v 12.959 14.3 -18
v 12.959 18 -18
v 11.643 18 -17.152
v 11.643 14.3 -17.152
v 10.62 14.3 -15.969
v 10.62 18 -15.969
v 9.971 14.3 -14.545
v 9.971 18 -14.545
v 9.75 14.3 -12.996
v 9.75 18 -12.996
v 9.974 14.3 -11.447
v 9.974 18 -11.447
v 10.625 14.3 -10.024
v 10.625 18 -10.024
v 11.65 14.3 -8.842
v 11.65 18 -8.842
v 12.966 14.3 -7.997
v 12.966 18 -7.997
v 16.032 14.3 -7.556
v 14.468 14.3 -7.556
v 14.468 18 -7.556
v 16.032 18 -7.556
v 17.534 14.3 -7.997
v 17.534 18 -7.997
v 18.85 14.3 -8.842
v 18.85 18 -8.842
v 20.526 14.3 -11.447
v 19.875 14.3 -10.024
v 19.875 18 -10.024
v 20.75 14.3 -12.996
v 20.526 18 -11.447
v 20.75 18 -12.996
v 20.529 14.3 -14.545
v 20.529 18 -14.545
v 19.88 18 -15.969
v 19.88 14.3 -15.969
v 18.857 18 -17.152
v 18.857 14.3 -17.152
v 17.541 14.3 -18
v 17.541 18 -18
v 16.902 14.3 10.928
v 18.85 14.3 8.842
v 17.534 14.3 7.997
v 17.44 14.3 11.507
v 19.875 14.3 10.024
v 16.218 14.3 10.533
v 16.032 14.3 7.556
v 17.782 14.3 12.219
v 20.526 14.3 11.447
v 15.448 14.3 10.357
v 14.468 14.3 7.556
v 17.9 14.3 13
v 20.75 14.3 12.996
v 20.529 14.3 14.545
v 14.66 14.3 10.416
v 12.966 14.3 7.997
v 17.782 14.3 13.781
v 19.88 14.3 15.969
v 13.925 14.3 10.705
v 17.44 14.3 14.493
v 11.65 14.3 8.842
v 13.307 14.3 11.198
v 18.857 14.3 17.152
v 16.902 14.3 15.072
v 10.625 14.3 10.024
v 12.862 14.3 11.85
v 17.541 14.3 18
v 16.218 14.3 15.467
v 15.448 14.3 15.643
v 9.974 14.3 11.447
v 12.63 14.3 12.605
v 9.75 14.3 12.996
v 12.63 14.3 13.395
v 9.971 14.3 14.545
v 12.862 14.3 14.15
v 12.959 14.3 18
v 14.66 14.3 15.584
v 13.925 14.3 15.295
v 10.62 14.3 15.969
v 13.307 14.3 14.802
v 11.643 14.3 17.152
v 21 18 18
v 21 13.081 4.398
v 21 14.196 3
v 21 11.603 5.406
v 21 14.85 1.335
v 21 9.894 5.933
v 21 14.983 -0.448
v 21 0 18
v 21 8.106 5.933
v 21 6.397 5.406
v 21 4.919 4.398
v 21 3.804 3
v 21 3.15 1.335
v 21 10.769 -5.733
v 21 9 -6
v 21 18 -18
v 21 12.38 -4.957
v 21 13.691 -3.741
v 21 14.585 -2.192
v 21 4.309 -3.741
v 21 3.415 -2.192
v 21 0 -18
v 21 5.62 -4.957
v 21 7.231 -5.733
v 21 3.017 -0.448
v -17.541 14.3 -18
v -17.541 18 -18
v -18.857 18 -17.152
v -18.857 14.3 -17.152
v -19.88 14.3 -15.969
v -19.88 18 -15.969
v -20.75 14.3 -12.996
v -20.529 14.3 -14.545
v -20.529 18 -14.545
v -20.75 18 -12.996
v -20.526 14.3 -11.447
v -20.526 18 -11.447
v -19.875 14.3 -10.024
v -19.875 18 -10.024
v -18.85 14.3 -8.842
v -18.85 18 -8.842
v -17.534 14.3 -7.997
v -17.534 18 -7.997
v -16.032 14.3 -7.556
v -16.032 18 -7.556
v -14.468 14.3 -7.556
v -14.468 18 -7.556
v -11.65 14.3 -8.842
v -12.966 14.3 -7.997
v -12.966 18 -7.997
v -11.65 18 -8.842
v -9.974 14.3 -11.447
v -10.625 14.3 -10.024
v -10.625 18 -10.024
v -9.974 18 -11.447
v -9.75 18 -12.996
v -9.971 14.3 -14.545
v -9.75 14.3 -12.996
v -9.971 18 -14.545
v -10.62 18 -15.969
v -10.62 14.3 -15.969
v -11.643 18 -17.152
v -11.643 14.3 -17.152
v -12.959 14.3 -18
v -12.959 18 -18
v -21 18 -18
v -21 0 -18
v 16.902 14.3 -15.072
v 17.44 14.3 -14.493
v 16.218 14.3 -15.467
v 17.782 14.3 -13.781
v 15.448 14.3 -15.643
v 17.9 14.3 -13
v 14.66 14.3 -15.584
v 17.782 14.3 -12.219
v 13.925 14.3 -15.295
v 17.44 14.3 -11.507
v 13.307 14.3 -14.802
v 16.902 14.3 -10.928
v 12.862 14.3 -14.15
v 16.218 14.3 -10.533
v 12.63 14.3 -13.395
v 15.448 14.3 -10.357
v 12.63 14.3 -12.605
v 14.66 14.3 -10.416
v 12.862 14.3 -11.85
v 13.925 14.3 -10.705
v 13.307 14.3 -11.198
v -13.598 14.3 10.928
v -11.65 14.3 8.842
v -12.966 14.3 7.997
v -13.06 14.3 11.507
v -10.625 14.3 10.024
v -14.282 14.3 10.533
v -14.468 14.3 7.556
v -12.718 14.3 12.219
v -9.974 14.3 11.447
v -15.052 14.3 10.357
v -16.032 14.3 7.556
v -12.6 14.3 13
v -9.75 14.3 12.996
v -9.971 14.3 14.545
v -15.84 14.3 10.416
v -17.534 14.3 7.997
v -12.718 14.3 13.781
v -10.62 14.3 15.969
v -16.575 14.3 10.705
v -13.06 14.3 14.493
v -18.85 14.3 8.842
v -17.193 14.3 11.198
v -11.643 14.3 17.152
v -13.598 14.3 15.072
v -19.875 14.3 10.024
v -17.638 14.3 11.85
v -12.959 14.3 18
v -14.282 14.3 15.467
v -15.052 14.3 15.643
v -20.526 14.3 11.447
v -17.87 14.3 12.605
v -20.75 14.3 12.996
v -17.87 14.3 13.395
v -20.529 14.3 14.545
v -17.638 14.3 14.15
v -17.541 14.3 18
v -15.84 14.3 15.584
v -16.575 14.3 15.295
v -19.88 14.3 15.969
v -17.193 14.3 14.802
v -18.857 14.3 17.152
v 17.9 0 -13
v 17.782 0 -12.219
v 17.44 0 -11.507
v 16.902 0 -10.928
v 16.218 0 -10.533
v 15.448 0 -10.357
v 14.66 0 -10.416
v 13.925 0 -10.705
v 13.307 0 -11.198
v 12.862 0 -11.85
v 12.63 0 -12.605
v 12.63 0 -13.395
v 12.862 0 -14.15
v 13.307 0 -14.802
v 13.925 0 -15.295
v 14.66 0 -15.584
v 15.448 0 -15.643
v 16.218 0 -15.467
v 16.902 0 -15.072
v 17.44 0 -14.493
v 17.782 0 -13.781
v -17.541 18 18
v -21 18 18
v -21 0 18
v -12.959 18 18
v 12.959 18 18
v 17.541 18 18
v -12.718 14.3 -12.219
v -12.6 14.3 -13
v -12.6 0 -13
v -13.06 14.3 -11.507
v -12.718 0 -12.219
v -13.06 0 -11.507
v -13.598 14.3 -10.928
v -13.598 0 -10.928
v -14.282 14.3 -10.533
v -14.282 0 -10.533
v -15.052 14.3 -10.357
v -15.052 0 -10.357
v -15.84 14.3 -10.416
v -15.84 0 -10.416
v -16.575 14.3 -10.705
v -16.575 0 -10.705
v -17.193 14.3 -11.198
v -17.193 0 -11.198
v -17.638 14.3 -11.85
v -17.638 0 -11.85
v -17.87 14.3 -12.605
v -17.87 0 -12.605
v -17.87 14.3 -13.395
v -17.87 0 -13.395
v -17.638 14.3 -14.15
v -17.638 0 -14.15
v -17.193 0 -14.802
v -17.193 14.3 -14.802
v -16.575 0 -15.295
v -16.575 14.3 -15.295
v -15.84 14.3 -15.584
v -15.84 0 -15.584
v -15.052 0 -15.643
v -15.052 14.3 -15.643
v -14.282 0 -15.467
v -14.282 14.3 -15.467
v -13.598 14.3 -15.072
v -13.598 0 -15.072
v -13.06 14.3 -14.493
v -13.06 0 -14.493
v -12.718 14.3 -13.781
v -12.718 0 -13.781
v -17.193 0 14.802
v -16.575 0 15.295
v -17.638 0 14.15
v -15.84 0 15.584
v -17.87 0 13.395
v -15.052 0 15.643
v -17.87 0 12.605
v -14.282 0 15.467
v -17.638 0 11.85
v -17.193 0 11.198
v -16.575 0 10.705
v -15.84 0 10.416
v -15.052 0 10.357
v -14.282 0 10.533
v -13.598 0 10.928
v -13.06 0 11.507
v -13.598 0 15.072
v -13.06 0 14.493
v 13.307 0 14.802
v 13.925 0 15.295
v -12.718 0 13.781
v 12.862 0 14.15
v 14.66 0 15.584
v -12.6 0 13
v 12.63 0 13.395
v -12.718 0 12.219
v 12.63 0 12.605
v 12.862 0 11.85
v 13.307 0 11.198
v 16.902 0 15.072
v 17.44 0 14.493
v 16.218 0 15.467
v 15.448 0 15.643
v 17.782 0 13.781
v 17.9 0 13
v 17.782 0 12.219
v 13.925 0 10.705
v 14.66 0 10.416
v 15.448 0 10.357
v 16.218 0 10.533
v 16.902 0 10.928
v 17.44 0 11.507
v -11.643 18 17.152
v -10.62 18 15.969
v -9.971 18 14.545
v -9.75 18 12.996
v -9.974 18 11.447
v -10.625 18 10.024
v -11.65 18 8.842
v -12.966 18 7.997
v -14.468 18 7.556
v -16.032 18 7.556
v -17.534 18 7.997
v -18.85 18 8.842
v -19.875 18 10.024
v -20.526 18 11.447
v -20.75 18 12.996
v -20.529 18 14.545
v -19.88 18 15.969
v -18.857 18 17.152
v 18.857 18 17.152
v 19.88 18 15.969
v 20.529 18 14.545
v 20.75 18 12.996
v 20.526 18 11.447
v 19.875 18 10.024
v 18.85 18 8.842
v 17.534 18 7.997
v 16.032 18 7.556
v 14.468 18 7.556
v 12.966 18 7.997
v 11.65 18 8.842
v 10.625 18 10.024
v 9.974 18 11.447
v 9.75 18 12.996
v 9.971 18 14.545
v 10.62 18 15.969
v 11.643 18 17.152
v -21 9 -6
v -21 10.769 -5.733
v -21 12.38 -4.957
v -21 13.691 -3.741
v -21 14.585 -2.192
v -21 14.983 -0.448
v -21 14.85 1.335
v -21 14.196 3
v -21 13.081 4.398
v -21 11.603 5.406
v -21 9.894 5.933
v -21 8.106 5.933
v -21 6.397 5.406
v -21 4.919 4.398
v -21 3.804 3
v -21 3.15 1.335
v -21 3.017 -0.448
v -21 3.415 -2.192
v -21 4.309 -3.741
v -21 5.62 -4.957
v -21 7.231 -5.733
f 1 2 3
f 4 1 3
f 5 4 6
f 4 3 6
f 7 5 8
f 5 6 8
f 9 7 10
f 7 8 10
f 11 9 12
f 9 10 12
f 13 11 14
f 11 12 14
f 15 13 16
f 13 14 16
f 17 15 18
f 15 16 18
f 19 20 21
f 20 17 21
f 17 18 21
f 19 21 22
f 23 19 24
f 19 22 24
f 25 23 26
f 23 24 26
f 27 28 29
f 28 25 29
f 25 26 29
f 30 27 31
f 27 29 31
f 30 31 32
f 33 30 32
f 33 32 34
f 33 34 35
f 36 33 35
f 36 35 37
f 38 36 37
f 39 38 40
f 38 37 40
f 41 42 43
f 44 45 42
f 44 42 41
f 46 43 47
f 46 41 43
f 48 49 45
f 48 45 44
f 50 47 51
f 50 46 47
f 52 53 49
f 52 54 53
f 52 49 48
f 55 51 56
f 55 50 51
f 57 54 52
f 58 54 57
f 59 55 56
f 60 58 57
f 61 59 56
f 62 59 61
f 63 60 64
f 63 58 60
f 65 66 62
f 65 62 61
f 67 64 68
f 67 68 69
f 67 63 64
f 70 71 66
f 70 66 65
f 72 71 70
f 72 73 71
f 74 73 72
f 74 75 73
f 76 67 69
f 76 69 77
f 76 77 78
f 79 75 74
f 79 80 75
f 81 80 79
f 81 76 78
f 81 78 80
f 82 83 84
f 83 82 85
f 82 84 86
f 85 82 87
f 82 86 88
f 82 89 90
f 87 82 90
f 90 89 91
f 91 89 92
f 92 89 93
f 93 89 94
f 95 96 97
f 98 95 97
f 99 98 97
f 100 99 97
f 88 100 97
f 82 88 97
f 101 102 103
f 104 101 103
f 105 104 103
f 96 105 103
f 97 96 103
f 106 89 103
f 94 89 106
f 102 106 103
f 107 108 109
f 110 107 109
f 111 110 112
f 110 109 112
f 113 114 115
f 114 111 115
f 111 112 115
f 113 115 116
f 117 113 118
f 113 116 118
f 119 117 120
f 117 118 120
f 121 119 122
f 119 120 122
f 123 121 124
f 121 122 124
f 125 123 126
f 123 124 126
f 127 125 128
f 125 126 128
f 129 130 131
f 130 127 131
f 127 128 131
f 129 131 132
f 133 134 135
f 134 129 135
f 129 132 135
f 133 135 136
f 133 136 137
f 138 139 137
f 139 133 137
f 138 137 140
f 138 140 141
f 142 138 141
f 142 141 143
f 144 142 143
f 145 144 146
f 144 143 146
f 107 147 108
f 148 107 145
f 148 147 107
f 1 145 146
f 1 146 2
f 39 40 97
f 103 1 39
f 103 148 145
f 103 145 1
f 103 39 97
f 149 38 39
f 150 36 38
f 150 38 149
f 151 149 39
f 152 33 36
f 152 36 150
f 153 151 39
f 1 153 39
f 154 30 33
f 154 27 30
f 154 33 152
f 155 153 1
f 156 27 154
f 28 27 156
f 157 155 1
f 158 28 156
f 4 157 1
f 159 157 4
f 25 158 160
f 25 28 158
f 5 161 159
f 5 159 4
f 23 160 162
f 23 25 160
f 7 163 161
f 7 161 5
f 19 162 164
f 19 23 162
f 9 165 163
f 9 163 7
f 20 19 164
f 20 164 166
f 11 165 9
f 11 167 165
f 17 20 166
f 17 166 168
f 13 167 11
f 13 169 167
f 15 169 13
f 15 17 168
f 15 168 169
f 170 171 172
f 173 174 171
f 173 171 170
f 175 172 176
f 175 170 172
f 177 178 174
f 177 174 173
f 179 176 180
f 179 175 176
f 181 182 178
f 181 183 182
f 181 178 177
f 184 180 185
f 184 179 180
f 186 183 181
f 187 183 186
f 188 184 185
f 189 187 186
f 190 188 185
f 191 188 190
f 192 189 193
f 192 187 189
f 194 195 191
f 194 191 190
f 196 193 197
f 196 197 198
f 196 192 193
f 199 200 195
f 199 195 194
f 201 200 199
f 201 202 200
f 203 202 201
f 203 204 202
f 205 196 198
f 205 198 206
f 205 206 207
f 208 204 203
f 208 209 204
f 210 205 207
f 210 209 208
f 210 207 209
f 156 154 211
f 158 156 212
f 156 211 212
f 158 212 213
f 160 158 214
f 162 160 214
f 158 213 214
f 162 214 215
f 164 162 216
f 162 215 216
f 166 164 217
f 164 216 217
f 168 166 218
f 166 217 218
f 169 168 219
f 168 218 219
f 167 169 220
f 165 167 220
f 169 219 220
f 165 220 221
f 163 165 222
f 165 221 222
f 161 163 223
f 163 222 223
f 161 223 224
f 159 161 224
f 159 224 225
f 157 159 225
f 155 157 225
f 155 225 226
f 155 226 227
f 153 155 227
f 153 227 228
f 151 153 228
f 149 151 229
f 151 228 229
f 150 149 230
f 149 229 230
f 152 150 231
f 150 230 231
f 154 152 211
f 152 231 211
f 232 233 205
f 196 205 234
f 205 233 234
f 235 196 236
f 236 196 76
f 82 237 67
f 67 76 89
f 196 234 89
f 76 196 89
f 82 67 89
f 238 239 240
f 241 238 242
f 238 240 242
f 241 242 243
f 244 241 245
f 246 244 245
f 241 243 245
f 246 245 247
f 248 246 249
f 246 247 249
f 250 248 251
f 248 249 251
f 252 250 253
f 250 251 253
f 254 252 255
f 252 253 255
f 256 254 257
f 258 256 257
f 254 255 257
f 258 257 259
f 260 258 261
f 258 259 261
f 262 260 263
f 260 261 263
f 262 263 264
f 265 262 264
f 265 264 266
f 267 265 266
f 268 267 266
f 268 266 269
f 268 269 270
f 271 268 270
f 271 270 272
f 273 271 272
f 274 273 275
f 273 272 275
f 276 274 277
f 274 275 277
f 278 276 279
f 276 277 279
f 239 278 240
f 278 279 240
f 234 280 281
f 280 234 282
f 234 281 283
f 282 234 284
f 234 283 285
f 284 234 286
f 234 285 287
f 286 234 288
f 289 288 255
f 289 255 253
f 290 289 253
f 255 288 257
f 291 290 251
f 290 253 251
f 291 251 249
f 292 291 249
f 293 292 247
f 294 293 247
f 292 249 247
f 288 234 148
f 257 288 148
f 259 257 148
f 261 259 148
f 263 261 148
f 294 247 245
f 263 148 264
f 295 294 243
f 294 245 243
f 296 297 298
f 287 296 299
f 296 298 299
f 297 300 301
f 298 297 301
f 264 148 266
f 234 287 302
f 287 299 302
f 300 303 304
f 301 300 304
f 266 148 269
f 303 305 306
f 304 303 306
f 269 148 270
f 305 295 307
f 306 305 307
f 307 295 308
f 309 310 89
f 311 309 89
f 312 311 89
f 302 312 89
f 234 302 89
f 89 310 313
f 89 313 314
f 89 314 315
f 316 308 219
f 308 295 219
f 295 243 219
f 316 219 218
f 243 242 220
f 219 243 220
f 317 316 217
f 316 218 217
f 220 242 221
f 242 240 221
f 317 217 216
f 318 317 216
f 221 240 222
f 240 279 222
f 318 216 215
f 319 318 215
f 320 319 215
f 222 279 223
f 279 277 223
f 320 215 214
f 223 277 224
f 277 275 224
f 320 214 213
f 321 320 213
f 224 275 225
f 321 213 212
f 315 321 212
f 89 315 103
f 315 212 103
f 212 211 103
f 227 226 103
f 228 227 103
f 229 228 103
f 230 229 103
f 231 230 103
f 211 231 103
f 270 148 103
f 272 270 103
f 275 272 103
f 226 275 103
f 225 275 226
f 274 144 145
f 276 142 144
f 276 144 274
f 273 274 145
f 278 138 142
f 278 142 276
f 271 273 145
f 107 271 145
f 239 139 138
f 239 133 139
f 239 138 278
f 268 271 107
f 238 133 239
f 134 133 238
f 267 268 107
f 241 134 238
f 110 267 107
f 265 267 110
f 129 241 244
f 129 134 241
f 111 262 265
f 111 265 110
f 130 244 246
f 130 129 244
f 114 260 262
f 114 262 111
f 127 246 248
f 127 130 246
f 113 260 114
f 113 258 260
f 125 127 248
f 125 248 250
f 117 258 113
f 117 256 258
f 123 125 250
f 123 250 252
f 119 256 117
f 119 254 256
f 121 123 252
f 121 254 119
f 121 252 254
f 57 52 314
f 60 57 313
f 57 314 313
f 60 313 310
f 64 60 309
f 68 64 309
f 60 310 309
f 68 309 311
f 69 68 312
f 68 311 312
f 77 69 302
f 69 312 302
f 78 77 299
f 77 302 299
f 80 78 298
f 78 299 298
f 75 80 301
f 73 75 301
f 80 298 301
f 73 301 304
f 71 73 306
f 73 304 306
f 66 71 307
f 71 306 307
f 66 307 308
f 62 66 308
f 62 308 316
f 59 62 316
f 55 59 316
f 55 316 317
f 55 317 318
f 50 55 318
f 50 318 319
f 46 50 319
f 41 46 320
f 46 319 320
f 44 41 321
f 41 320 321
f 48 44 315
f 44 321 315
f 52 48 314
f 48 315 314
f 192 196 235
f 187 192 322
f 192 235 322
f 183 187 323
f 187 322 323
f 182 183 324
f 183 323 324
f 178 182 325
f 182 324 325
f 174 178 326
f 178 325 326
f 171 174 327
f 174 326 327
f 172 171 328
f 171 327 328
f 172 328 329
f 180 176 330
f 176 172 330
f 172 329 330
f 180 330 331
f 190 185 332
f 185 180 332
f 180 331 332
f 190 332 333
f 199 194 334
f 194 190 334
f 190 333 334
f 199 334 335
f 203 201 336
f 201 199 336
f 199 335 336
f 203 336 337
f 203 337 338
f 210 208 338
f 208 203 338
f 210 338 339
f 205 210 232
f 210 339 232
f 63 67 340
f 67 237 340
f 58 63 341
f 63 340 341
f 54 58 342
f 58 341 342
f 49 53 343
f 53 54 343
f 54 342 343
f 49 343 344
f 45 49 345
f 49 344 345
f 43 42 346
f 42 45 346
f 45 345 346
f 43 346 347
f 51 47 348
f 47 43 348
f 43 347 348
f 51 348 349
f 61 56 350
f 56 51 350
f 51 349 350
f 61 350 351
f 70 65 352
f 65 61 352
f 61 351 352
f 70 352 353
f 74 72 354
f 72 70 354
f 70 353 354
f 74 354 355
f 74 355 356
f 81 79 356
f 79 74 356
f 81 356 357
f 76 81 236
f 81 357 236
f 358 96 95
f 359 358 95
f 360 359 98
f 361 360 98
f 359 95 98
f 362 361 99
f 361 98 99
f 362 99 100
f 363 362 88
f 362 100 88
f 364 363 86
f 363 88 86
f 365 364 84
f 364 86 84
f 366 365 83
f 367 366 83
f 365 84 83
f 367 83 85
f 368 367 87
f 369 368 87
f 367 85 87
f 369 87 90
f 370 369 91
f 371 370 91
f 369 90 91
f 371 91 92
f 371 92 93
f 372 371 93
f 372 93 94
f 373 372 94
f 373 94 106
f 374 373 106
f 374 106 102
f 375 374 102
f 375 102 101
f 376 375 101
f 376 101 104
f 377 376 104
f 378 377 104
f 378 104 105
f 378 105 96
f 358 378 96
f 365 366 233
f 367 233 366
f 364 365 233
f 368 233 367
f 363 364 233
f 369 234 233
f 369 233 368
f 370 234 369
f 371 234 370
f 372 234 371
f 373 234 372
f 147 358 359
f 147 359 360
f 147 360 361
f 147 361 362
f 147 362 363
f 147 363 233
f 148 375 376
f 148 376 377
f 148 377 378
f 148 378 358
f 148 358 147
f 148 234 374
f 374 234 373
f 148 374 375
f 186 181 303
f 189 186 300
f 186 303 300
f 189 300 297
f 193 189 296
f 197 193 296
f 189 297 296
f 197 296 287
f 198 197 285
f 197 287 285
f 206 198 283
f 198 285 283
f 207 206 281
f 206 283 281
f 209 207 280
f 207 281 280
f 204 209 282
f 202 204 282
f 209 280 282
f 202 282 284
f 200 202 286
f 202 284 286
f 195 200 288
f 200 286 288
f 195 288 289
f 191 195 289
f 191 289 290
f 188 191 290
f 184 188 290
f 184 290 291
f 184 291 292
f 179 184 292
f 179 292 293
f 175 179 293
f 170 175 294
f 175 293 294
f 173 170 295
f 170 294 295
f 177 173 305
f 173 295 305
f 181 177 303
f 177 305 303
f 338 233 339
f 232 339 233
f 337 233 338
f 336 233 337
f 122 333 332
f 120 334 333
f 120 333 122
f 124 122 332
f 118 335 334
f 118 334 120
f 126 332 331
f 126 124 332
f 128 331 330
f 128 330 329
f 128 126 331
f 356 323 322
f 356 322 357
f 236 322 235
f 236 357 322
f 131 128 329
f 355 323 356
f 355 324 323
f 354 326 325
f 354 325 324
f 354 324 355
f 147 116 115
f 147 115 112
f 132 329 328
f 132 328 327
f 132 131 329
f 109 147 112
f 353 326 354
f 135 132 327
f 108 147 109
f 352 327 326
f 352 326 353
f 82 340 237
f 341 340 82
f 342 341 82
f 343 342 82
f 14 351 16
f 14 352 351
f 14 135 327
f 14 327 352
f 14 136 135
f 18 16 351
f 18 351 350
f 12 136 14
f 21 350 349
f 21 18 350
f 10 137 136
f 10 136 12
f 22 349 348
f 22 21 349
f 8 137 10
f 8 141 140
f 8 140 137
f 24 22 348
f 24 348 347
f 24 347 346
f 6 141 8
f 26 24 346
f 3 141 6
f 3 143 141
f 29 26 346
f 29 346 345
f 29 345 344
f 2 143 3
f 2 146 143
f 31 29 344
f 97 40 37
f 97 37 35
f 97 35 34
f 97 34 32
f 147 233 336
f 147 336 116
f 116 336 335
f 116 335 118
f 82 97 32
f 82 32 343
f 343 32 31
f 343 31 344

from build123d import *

# Parameters (mm, degrees)
SKETCH1_W                                        = 42
SKETCH1_H                                        = 36
BOSS_EXTRUDE1_DEPTH                              = 18
CBORE_FOR_M5_PAN_HEAD_MACHINE_SCREW3_D           = 5.3
CBORE_FOR_M5_PAN_HEAD_MACHINE_SCREW3_CBORE_D     = 11
CBORE_FOR_M5_PAN_HEAD_MACHINE_SCREW3_CBORE_DEPTH = 3.7
SKETCH7_R                                        = 6
CUT_EXTRUDE1_DEPTH                               = 50.112116631


with BuildPart() as part:
    # Sketch1 → Boss-Extrude1 (new body)
    with BuildSketch(Plane(origin=(0, 0, 0), x_dir=(1, 0, 0), z_dir=(0, 1, 0))):
        Rectangle(SKETCH1_W, SKETCH1_H)
    extrude(amount=BOSS_EXTRUDE1_DEPTH)

    # CBORE for M5 Pan Head Machine Screw3 (through all)
    with Locations(Plane(origin=(-6.549083899, 18, -3.689624732), x_dir=(-1, 0, 0), z_dir=(0, 1, 0))):
        with Locations((8.700916101, 16.689624732), (-21.799083899, 16.689624732), (-21.799083899, -9.310375268), (8.700916101, -9.310375268)):
            CounterBoreHole(CBORE_FOR_M5_PAN_HEAD_MACHINE_SCREW3_D / 2, CBORE_FOR_M5_PAN_HEAD_MACHINE_SCREW3_CBORE_D / 2, CBORE_FOR_M5_PAN_HEAD_MACHINE_SCREW3_CBORE_DEPTH)

    # Sketch7 → Cut-Extrude1 (cut, through all)
    with BuildSketch(Plane(origin=(21, 0, 0), x_dir=(0, 0, -1), z_dir=(1, 0, 0))):
        with Locations((0, 9)):
            Circle(SKETCH7_R)
    extrude(amount=-CUT_EXTRUDE1_DEPTH, mode=Mode.SUBTRACT)


solid = part.part
